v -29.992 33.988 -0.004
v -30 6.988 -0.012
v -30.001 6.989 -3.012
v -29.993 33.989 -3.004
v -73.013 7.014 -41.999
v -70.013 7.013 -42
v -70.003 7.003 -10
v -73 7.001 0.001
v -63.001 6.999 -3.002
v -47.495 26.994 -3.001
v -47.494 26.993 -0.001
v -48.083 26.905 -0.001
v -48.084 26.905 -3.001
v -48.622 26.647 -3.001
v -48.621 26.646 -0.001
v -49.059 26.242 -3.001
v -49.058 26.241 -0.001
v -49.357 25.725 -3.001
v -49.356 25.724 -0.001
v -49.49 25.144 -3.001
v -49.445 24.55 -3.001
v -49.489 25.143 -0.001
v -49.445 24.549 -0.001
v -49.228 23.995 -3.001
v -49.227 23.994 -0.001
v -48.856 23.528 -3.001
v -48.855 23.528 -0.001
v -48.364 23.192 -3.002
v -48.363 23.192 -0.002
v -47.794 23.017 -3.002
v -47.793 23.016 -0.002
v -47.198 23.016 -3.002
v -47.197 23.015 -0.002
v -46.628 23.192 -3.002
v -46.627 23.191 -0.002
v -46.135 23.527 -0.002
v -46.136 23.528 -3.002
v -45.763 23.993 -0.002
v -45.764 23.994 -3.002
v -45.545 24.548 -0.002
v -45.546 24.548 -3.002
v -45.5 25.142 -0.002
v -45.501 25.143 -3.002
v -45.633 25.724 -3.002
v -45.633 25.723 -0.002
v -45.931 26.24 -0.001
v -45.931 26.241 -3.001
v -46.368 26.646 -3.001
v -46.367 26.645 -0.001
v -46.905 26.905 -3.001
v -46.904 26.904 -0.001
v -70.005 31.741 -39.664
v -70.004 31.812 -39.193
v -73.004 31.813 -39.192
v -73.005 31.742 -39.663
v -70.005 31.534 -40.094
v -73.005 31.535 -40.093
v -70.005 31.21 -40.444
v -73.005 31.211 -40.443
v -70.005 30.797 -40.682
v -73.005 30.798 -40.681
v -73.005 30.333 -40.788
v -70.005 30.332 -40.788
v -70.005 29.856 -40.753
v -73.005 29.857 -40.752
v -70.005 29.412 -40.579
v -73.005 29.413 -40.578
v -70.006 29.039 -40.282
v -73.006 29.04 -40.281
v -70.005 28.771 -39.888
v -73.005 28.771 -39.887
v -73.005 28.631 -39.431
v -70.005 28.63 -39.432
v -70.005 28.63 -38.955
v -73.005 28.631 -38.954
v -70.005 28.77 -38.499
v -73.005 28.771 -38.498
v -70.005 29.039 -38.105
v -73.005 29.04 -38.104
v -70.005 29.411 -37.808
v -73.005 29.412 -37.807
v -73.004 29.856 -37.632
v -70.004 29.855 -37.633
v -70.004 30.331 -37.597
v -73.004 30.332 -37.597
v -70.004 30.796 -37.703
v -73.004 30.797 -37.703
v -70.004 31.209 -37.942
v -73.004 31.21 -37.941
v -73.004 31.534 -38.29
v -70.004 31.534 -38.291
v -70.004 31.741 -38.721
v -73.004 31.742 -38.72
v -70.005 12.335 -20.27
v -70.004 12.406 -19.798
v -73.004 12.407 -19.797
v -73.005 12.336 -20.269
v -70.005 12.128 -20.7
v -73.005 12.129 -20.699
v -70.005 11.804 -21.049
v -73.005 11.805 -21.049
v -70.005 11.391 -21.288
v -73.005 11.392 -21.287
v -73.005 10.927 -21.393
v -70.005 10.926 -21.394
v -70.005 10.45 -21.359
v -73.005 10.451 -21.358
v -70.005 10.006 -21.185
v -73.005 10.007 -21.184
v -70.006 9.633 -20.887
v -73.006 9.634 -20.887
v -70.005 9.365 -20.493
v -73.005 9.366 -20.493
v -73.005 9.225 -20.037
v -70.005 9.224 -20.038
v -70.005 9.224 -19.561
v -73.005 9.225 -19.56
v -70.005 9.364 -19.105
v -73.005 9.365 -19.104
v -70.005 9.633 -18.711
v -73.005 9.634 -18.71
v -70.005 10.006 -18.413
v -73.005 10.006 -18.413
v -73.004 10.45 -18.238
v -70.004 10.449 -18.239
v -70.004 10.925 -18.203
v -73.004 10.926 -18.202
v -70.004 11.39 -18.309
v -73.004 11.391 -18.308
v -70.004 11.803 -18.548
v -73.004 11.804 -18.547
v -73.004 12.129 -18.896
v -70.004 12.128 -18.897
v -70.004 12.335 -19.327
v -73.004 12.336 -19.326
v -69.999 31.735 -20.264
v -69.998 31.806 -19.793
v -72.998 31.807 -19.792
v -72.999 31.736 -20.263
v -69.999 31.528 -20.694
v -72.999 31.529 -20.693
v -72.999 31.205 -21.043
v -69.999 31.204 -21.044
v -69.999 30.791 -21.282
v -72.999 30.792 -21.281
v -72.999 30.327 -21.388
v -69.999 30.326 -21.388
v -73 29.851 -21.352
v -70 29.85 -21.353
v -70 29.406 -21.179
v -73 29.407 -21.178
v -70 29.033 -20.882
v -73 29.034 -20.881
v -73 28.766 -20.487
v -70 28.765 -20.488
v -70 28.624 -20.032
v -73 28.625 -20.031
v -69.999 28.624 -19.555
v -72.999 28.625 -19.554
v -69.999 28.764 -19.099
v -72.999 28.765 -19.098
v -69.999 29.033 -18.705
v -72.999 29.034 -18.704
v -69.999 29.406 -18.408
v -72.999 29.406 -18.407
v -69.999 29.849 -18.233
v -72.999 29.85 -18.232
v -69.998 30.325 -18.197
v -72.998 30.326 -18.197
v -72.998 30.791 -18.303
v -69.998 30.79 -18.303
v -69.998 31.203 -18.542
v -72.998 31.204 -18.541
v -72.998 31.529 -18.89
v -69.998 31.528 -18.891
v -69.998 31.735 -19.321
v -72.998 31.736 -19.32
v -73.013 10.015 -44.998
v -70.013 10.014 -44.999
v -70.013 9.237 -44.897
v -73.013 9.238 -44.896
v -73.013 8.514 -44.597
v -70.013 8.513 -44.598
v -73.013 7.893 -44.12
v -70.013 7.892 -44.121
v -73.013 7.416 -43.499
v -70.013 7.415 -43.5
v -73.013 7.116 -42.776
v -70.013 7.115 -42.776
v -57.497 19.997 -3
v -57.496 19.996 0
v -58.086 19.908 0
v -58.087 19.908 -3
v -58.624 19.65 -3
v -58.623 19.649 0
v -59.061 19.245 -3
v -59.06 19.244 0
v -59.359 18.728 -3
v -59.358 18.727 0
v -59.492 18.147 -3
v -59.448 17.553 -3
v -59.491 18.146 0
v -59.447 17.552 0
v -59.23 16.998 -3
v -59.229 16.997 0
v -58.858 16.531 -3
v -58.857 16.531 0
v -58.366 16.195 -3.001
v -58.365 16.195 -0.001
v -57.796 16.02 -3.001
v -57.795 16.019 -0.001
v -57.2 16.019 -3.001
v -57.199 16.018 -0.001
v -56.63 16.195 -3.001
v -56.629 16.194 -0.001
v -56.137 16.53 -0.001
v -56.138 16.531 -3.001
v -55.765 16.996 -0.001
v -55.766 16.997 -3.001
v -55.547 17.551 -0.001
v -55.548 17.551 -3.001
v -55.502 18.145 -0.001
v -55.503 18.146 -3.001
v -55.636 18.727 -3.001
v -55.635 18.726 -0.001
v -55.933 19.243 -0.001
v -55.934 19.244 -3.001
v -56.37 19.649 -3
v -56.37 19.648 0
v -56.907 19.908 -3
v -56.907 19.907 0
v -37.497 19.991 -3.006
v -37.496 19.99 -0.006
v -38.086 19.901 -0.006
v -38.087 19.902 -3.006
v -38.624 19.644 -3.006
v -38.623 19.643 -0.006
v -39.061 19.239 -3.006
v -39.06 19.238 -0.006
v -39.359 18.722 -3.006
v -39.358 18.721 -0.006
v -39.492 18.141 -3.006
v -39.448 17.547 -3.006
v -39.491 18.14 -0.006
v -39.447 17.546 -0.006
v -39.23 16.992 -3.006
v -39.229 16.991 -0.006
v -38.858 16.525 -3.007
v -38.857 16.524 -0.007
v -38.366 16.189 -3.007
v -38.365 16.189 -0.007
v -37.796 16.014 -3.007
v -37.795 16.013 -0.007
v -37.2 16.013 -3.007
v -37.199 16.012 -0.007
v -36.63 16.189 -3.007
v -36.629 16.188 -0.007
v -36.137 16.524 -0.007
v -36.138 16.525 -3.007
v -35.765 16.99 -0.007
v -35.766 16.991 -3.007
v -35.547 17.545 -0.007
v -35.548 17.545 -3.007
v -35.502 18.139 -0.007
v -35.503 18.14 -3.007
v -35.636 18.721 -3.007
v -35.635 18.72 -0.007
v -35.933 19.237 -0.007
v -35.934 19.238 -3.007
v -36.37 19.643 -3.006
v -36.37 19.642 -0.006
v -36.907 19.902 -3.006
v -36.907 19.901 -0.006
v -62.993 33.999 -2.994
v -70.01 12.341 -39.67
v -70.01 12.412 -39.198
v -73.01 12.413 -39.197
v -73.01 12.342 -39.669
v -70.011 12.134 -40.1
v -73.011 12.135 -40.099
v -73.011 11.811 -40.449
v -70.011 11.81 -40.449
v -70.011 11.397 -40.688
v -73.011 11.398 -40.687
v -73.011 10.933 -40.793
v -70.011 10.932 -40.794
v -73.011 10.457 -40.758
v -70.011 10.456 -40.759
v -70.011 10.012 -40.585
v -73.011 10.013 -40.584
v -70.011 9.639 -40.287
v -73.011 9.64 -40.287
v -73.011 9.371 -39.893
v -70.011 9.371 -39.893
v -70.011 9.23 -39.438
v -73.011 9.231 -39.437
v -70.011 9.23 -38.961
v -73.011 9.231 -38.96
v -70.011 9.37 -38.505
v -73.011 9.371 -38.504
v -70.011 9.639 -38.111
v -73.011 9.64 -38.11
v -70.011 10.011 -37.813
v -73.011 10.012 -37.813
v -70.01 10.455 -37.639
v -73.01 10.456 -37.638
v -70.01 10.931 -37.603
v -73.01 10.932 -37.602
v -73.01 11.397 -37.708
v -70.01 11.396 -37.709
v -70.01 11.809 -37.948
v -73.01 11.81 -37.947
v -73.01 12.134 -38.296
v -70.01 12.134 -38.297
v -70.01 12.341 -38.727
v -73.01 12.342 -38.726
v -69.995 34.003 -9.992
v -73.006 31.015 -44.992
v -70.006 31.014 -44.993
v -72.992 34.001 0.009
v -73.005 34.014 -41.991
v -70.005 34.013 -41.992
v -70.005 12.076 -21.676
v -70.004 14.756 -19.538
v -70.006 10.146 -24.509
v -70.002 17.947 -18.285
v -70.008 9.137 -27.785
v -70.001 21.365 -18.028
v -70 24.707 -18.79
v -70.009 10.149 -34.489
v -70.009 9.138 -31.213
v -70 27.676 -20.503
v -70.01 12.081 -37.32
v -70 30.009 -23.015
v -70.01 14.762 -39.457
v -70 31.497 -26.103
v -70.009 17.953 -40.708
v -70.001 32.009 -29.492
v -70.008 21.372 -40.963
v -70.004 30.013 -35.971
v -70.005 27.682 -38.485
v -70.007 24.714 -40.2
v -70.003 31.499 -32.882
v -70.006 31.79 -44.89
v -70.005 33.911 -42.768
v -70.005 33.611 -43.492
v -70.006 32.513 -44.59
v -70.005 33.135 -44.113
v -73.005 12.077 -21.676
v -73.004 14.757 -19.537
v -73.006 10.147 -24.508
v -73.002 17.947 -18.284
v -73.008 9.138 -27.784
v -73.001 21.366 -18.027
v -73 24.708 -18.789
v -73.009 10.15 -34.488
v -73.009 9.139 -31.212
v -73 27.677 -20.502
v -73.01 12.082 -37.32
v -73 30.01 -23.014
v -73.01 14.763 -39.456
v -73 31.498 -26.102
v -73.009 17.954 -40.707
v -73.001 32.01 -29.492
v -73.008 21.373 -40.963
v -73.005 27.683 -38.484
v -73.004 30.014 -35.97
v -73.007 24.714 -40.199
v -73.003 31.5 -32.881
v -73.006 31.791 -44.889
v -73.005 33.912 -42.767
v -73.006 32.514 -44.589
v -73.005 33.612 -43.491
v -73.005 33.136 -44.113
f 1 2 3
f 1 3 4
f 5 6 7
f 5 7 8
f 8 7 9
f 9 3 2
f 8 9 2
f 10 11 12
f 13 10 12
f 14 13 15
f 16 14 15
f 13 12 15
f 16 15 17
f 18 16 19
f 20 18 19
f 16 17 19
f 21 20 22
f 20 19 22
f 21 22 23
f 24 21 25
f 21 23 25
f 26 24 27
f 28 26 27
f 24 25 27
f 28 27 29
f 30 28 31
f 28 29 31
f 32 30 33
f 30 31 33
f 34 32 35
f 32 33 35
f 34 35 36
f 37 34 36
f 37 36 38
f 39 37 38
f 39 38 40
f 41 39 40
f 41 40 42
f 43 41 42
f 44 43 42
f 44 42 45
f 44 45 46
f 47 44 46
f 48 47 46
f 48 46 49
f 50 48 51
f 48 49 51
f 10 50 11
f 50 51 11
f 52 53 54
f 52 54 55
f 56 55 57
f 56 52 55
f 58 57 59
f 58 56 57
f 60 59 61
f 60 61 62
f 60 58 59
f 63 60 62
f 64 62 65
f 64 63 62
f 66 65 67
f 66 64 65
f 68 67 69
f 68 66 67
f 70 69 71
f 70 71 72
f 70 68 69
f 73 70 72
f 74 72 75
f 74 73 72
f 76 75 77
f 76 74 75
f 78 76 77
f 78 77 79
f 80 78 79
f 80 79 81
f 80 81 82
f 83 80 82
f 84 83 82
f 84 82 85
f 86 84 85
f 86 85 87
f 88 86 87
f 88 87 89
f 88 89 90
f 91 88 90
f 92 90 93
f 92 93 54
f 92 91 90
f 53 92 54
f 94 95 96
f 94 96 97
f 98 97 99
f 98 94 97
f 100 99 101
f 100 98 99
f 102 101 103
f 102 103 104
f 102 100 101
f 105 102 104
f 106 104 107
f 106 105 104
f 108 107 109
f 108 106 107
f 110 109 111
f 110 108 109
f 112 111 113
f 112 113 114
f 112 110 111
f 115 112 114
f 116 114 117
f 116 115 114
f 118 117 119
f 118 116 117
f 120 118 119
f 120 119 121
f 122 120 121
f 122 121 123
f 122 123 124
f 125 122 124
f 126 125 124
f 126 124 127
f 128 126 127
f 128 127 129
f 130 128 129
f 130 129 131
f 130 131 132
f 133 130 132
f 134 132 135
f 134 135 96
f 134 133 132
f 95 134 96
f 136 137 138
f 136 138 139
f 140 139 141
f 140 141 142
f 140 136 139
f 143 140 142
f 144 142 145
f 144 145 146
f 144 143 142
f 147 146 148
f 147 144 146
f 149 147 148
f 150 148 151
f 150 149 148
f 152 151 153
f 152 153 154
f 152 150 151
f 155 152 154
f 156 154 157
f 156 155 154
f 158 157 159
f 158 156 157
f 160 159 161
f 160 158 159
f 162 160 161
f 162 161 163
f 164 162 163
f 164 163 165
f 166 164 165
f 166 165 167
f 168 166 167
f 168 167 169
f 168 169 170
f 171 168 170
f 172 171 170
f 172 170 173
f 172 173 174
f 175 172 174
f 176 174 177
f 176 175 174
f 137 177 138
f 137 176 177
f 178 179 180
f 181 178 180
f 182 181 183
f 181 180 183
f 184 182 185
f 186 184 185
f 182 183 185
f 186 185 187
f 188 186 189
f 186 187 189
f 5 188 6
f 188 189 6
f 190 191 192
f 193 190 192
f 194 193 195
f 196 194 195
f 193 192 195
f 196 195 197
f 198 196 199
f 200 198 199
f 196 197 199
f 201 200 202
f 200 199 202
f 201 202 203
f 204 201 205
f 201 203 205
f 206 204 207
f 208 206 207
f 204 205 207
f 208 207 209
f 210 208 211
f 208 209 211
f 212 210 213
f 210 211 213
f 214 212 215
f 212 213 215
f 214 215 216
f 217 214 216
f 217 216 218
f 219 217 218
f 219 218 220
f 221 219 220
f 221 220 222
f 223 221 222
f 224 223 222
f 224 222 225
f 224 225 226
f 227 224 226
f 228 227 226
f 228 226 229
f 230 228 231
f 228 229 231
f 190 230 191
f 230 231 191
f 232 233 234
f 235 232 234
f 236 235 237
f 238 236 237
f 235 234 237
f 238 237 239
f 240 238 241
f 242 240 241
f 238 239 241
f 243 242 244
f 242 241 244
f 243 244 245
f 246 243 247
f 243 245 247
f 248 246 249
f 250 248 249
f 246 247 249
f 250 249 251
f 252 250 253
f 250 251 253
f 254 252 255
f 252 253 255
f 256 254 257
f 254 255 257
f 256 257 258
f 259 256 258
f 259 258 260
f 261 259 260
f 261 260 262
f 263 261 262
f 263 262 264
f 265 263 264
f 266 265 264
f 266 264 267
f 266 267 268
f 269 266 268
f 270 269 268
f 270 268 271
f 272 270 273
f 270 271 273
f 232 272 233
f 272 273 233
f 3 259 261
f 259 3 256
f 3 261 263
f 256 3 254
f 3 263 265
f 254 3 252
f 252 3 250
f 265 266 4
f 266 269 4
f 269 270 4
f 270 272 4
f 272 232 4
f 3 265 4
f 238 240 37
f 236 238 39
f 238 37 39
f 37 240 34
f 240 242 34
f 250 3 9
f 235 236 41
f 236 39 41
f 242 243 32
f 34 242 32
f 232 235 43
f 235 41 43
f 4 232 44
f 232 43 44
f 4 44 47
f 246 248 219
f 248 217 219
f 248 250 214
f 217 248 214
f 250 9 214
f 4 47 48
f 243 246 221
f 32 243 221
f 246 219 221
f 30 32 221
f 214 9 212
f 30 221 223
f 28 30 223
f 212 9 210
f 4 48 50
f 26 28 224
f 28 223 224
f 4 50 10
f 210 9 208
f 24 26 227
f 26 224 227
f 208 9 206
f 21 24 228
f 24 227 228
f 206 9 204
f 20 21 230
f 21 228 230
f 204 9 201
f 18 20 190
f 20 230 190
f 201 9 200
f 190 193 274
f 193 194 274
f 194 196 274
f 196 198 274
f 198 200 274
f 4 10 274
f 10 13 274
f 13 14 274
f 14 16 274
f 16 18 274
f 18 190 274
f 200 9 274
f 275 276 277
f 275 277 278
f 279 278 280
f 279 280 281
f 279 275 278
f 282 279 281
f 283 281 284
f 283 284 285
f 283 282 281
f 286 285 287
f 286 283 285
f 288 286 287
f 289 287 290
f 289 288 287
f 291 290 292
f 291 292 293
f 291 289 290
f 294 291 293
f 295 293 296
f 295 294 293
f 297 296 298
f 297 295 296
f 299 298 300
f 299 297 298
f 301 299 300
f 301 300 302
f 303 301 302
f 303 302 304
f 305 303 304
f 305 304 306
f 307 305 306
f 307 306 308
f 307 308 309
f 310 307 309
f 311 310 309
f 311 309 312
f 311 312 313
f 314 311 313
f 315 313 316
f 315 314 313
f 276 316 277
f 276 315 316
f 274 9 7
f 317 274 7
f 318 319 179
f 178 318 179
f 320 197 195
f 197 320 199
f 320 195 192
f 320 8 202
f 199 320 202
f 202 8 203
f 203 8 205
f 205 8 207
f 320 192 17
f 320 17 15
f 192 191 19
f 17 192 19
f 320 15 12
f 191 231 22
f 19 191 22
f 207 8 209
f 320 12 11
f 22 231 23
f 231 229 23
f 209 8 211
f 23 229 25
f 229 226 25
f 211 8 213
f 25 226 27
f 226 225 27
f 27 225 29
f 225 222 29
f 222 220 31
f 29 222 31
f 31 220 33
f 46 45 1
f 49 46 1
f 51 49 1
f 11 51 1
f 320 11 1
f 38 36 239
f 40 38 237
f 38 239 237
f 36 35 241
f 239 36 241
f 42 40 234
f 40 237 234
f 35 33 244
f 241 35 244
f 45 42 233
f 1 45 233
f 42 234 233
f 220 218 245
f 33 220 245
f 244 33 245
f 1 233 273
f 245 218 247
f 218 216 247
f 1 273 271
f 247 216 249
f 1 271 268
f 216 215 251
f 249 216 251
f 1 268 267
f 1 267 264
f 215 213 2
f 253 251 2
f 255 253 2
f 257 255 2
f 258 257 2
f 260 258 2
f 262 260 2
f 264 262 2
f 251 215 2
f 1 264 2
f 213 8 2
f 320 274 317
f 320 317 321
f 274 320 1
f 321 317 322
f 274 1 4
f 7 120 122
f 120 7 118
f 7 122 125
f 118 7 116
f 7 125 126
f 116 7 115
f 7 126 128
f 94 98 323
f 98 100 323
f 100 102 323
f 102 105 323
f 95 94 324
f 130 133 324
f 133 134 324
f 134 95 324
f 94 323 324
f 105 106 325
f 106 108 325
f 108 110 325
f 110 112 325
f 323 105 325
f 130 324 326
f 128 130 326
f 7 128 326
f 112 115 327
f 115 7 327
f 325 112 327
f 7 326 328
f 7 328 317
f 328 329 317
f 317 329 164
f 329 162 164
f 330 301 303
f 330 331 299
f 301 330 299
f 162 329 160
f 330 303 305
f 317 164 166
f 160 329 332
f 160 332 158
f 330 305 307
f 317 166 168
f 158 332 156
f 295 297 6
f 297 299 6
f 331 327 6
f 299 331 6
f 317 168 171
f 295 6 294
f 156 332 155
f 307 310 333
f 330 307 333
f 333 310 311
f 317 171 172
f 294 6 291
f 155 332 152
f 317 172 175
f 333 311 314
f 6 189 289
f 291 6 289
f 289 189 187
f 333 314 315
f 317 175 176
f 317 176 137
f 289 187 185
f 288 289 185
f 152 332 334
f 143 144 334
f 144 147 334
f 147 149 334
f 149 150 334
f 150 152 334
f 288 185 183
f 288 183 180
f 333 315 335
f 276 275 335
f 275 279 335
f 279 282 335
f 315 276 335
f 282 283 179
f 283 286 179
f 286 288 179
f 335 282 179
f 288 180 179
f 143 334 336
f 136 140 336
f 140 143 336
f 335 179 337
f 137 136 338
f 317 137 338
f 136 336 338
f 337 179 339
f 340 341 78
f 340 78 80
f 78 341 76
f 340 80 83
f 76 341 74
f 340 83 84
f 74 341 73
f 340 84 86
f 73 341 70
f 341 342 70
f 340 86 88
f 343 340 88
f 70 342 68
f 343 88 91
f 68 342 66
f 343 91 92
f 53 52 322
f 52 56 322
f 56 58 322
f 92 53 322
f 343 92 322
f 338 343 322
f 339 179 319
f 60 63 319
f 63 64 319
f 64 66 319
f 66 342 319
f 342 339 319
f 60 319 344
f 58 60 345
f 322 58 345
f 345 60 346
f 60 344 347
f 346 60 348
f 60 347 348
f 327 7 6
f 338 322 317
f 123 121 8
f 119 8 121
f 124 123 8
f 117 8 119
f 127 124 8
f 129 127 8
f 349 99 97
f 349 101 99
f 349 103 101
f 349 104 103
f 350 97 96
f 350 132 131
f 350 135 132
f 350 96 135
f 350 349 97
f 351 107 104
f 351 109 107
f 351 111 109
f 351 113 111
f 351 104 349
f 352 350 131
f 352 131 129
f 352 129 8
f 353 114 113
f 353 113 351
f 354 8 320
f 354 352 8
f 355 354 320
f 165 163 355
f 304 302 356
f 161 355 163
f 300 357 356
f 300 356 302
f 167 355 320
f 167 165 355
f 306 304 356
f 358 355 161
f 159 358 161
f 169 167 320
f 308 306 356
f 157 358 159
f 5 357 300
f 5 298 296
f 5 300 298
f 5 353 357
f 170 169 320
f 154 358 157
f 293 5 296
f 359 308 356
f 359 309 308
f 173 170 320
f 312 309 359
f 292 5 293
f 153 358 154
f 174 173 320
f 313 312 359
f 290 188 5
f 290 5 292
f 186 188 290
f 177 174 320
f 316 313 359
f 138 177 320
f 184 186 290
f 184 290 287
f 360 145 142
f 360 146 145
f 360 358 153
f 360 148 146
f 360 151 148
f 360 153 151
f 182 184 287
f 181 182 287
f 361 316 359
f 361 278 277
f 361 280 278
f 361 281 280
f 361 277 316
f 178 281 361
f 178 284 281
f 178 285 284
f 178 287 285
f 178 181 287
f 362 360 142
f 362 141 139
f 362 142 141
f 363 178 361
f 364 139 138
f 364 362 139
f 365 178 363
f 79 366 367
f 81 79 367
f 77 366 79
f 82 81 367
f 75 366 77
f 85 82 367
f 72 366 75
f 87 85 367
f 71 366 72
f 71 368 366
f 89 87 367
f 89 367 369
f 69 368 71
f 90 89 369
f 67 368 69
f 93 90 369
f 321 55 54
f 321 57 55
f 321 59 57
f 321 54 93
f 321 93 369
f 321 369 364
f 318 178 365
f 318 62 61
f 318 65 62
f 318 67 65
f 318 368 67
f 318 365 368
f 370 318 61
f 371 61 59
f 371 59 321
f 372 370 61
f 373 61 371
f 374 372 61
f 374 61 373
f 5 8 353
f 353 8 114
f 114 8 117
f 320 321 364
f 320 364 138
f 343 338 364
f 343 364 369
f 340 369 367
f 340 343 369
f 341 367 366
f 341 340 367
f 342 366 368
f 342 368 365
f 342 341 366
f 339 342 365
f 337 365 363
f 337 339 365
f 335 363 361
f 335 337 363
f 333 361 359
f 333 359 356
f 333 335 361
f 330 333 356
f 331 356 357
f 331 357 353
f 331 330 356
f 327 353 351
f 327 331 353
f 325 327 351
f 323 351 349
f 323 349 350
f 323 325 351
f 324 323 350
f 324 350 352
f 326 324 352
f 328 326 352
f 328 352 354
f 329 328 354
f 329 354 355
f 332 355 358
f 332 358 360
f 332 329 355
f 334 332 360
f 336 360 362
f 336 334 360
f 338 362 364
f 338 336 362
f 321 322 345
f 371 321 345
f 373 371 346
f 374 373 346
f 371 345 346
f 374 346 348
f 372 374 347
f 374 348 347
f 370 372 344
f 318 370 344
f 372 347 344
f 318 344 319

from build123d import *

# Parameters (mm, degrees)
SKETCH005_W             = 27
SKETCH005_H             = 40
SKETCH005_R             = 2
PAD003_DEPTH            = 3
SKETCH004_R             = 11.5
SKETCH004_R_2           = 1.6
PAD004_DEPTH            = 3
PAD024_DEPTH            = 27
BODY002_ROLL_ANGLE      = -89.9826768737
BODY002_PITCH_ANGLE     = -0.0173178896
BODY002_PLACEMENT_ANGLE = 89.9826768737


with BuildPart() as part:
    # Sketch005 → Pad003 (new body)
    with BuildSketch(Plane.XZ):
        with Locations((13.5, -20)):
            Rectangle(SKETCH005_W, SKETCH005_H)
        with Locations((11, -12.5)):
            Circle(SKETCH005_R, mode=Mode.SUBTRACT)
        with Locations((18, -22.5)):
            Circle(SKETCH005_R, mode=Mode.SUBTRACT)
        with Locations((11, -32.5)):
            Circle(SKETCH005_R, mode=Mode.SUBTRACT)
    extrude(amount=-PAD003_DEPTH)

    # Sketch004 → Pad004 (join)
    with BuildSketch(Plane.XY):
        with BuildLine():
            Line((0, 42), (0, 0))
            Line((0, 0), (27, 0))
            Line((27, 0), (27, 42))
            ThreePointArc((27, 42), (26.1213203436, 44.1213203436), (24, 45))
            Line((24, 45), (3, 45))
            ThreePointArc((3, 45), (0.8786796564, 44.1213203436), (0, 42))
        make_face()
        with Locations((13.5, 29.5)):
            Circle(SKETCH004_R, mode=Mode.SUBTRACT)
        with Locations((3.8, 39.2)):
            Circle(SKETCH004_R_2, mode=Mode.SUBTRACT)
        with Locations((23.2, 39.2)):
            Circle(SKETCH004_R_2, mode=Mode.SUBTRACT)
        with Locations((23.2, 19.8)):
            Circle(SKETCH004_R_2, mode=Mode.SUBTRACT)
        with Locations((3.8, 19.8)):
            Circle(SKETCH004_R_2, mode=Mode.SUBTRACT)
    extrude(amount=PAD004_DEPTH)

    # Sketch043 → Pad024 (join)
    with BuildSketch(Plane.YZ):
        Polygon((0, 0), (0, -10), (10, 0), align=None)
    extrude(amount=PAD024_DEPTH)


with BuildPart() as part_1:
    # Body002 roll: moved
    add(part.part.rotate(Axis((0, 0, 0), (1, 0, 0)), BODY002_ROLL_ANGLE))


with BuildPart() as part_2:
    # Body002 pitch: moved
    add(part_1.part.rotate(Axis((0, 0, 0), (0, 1, 0)), BODY002_PITCH_ANGLE))


with BuildPart() as part_3:
    # Body002 placement: moved
    add(part_2.part.moved(Location((-70, 7, 0))).rotate(Axis((-70, 7, 0), (0, 0, 1)), BODY002_PLACEMENT_ANGLE))


solid = part_3.part
